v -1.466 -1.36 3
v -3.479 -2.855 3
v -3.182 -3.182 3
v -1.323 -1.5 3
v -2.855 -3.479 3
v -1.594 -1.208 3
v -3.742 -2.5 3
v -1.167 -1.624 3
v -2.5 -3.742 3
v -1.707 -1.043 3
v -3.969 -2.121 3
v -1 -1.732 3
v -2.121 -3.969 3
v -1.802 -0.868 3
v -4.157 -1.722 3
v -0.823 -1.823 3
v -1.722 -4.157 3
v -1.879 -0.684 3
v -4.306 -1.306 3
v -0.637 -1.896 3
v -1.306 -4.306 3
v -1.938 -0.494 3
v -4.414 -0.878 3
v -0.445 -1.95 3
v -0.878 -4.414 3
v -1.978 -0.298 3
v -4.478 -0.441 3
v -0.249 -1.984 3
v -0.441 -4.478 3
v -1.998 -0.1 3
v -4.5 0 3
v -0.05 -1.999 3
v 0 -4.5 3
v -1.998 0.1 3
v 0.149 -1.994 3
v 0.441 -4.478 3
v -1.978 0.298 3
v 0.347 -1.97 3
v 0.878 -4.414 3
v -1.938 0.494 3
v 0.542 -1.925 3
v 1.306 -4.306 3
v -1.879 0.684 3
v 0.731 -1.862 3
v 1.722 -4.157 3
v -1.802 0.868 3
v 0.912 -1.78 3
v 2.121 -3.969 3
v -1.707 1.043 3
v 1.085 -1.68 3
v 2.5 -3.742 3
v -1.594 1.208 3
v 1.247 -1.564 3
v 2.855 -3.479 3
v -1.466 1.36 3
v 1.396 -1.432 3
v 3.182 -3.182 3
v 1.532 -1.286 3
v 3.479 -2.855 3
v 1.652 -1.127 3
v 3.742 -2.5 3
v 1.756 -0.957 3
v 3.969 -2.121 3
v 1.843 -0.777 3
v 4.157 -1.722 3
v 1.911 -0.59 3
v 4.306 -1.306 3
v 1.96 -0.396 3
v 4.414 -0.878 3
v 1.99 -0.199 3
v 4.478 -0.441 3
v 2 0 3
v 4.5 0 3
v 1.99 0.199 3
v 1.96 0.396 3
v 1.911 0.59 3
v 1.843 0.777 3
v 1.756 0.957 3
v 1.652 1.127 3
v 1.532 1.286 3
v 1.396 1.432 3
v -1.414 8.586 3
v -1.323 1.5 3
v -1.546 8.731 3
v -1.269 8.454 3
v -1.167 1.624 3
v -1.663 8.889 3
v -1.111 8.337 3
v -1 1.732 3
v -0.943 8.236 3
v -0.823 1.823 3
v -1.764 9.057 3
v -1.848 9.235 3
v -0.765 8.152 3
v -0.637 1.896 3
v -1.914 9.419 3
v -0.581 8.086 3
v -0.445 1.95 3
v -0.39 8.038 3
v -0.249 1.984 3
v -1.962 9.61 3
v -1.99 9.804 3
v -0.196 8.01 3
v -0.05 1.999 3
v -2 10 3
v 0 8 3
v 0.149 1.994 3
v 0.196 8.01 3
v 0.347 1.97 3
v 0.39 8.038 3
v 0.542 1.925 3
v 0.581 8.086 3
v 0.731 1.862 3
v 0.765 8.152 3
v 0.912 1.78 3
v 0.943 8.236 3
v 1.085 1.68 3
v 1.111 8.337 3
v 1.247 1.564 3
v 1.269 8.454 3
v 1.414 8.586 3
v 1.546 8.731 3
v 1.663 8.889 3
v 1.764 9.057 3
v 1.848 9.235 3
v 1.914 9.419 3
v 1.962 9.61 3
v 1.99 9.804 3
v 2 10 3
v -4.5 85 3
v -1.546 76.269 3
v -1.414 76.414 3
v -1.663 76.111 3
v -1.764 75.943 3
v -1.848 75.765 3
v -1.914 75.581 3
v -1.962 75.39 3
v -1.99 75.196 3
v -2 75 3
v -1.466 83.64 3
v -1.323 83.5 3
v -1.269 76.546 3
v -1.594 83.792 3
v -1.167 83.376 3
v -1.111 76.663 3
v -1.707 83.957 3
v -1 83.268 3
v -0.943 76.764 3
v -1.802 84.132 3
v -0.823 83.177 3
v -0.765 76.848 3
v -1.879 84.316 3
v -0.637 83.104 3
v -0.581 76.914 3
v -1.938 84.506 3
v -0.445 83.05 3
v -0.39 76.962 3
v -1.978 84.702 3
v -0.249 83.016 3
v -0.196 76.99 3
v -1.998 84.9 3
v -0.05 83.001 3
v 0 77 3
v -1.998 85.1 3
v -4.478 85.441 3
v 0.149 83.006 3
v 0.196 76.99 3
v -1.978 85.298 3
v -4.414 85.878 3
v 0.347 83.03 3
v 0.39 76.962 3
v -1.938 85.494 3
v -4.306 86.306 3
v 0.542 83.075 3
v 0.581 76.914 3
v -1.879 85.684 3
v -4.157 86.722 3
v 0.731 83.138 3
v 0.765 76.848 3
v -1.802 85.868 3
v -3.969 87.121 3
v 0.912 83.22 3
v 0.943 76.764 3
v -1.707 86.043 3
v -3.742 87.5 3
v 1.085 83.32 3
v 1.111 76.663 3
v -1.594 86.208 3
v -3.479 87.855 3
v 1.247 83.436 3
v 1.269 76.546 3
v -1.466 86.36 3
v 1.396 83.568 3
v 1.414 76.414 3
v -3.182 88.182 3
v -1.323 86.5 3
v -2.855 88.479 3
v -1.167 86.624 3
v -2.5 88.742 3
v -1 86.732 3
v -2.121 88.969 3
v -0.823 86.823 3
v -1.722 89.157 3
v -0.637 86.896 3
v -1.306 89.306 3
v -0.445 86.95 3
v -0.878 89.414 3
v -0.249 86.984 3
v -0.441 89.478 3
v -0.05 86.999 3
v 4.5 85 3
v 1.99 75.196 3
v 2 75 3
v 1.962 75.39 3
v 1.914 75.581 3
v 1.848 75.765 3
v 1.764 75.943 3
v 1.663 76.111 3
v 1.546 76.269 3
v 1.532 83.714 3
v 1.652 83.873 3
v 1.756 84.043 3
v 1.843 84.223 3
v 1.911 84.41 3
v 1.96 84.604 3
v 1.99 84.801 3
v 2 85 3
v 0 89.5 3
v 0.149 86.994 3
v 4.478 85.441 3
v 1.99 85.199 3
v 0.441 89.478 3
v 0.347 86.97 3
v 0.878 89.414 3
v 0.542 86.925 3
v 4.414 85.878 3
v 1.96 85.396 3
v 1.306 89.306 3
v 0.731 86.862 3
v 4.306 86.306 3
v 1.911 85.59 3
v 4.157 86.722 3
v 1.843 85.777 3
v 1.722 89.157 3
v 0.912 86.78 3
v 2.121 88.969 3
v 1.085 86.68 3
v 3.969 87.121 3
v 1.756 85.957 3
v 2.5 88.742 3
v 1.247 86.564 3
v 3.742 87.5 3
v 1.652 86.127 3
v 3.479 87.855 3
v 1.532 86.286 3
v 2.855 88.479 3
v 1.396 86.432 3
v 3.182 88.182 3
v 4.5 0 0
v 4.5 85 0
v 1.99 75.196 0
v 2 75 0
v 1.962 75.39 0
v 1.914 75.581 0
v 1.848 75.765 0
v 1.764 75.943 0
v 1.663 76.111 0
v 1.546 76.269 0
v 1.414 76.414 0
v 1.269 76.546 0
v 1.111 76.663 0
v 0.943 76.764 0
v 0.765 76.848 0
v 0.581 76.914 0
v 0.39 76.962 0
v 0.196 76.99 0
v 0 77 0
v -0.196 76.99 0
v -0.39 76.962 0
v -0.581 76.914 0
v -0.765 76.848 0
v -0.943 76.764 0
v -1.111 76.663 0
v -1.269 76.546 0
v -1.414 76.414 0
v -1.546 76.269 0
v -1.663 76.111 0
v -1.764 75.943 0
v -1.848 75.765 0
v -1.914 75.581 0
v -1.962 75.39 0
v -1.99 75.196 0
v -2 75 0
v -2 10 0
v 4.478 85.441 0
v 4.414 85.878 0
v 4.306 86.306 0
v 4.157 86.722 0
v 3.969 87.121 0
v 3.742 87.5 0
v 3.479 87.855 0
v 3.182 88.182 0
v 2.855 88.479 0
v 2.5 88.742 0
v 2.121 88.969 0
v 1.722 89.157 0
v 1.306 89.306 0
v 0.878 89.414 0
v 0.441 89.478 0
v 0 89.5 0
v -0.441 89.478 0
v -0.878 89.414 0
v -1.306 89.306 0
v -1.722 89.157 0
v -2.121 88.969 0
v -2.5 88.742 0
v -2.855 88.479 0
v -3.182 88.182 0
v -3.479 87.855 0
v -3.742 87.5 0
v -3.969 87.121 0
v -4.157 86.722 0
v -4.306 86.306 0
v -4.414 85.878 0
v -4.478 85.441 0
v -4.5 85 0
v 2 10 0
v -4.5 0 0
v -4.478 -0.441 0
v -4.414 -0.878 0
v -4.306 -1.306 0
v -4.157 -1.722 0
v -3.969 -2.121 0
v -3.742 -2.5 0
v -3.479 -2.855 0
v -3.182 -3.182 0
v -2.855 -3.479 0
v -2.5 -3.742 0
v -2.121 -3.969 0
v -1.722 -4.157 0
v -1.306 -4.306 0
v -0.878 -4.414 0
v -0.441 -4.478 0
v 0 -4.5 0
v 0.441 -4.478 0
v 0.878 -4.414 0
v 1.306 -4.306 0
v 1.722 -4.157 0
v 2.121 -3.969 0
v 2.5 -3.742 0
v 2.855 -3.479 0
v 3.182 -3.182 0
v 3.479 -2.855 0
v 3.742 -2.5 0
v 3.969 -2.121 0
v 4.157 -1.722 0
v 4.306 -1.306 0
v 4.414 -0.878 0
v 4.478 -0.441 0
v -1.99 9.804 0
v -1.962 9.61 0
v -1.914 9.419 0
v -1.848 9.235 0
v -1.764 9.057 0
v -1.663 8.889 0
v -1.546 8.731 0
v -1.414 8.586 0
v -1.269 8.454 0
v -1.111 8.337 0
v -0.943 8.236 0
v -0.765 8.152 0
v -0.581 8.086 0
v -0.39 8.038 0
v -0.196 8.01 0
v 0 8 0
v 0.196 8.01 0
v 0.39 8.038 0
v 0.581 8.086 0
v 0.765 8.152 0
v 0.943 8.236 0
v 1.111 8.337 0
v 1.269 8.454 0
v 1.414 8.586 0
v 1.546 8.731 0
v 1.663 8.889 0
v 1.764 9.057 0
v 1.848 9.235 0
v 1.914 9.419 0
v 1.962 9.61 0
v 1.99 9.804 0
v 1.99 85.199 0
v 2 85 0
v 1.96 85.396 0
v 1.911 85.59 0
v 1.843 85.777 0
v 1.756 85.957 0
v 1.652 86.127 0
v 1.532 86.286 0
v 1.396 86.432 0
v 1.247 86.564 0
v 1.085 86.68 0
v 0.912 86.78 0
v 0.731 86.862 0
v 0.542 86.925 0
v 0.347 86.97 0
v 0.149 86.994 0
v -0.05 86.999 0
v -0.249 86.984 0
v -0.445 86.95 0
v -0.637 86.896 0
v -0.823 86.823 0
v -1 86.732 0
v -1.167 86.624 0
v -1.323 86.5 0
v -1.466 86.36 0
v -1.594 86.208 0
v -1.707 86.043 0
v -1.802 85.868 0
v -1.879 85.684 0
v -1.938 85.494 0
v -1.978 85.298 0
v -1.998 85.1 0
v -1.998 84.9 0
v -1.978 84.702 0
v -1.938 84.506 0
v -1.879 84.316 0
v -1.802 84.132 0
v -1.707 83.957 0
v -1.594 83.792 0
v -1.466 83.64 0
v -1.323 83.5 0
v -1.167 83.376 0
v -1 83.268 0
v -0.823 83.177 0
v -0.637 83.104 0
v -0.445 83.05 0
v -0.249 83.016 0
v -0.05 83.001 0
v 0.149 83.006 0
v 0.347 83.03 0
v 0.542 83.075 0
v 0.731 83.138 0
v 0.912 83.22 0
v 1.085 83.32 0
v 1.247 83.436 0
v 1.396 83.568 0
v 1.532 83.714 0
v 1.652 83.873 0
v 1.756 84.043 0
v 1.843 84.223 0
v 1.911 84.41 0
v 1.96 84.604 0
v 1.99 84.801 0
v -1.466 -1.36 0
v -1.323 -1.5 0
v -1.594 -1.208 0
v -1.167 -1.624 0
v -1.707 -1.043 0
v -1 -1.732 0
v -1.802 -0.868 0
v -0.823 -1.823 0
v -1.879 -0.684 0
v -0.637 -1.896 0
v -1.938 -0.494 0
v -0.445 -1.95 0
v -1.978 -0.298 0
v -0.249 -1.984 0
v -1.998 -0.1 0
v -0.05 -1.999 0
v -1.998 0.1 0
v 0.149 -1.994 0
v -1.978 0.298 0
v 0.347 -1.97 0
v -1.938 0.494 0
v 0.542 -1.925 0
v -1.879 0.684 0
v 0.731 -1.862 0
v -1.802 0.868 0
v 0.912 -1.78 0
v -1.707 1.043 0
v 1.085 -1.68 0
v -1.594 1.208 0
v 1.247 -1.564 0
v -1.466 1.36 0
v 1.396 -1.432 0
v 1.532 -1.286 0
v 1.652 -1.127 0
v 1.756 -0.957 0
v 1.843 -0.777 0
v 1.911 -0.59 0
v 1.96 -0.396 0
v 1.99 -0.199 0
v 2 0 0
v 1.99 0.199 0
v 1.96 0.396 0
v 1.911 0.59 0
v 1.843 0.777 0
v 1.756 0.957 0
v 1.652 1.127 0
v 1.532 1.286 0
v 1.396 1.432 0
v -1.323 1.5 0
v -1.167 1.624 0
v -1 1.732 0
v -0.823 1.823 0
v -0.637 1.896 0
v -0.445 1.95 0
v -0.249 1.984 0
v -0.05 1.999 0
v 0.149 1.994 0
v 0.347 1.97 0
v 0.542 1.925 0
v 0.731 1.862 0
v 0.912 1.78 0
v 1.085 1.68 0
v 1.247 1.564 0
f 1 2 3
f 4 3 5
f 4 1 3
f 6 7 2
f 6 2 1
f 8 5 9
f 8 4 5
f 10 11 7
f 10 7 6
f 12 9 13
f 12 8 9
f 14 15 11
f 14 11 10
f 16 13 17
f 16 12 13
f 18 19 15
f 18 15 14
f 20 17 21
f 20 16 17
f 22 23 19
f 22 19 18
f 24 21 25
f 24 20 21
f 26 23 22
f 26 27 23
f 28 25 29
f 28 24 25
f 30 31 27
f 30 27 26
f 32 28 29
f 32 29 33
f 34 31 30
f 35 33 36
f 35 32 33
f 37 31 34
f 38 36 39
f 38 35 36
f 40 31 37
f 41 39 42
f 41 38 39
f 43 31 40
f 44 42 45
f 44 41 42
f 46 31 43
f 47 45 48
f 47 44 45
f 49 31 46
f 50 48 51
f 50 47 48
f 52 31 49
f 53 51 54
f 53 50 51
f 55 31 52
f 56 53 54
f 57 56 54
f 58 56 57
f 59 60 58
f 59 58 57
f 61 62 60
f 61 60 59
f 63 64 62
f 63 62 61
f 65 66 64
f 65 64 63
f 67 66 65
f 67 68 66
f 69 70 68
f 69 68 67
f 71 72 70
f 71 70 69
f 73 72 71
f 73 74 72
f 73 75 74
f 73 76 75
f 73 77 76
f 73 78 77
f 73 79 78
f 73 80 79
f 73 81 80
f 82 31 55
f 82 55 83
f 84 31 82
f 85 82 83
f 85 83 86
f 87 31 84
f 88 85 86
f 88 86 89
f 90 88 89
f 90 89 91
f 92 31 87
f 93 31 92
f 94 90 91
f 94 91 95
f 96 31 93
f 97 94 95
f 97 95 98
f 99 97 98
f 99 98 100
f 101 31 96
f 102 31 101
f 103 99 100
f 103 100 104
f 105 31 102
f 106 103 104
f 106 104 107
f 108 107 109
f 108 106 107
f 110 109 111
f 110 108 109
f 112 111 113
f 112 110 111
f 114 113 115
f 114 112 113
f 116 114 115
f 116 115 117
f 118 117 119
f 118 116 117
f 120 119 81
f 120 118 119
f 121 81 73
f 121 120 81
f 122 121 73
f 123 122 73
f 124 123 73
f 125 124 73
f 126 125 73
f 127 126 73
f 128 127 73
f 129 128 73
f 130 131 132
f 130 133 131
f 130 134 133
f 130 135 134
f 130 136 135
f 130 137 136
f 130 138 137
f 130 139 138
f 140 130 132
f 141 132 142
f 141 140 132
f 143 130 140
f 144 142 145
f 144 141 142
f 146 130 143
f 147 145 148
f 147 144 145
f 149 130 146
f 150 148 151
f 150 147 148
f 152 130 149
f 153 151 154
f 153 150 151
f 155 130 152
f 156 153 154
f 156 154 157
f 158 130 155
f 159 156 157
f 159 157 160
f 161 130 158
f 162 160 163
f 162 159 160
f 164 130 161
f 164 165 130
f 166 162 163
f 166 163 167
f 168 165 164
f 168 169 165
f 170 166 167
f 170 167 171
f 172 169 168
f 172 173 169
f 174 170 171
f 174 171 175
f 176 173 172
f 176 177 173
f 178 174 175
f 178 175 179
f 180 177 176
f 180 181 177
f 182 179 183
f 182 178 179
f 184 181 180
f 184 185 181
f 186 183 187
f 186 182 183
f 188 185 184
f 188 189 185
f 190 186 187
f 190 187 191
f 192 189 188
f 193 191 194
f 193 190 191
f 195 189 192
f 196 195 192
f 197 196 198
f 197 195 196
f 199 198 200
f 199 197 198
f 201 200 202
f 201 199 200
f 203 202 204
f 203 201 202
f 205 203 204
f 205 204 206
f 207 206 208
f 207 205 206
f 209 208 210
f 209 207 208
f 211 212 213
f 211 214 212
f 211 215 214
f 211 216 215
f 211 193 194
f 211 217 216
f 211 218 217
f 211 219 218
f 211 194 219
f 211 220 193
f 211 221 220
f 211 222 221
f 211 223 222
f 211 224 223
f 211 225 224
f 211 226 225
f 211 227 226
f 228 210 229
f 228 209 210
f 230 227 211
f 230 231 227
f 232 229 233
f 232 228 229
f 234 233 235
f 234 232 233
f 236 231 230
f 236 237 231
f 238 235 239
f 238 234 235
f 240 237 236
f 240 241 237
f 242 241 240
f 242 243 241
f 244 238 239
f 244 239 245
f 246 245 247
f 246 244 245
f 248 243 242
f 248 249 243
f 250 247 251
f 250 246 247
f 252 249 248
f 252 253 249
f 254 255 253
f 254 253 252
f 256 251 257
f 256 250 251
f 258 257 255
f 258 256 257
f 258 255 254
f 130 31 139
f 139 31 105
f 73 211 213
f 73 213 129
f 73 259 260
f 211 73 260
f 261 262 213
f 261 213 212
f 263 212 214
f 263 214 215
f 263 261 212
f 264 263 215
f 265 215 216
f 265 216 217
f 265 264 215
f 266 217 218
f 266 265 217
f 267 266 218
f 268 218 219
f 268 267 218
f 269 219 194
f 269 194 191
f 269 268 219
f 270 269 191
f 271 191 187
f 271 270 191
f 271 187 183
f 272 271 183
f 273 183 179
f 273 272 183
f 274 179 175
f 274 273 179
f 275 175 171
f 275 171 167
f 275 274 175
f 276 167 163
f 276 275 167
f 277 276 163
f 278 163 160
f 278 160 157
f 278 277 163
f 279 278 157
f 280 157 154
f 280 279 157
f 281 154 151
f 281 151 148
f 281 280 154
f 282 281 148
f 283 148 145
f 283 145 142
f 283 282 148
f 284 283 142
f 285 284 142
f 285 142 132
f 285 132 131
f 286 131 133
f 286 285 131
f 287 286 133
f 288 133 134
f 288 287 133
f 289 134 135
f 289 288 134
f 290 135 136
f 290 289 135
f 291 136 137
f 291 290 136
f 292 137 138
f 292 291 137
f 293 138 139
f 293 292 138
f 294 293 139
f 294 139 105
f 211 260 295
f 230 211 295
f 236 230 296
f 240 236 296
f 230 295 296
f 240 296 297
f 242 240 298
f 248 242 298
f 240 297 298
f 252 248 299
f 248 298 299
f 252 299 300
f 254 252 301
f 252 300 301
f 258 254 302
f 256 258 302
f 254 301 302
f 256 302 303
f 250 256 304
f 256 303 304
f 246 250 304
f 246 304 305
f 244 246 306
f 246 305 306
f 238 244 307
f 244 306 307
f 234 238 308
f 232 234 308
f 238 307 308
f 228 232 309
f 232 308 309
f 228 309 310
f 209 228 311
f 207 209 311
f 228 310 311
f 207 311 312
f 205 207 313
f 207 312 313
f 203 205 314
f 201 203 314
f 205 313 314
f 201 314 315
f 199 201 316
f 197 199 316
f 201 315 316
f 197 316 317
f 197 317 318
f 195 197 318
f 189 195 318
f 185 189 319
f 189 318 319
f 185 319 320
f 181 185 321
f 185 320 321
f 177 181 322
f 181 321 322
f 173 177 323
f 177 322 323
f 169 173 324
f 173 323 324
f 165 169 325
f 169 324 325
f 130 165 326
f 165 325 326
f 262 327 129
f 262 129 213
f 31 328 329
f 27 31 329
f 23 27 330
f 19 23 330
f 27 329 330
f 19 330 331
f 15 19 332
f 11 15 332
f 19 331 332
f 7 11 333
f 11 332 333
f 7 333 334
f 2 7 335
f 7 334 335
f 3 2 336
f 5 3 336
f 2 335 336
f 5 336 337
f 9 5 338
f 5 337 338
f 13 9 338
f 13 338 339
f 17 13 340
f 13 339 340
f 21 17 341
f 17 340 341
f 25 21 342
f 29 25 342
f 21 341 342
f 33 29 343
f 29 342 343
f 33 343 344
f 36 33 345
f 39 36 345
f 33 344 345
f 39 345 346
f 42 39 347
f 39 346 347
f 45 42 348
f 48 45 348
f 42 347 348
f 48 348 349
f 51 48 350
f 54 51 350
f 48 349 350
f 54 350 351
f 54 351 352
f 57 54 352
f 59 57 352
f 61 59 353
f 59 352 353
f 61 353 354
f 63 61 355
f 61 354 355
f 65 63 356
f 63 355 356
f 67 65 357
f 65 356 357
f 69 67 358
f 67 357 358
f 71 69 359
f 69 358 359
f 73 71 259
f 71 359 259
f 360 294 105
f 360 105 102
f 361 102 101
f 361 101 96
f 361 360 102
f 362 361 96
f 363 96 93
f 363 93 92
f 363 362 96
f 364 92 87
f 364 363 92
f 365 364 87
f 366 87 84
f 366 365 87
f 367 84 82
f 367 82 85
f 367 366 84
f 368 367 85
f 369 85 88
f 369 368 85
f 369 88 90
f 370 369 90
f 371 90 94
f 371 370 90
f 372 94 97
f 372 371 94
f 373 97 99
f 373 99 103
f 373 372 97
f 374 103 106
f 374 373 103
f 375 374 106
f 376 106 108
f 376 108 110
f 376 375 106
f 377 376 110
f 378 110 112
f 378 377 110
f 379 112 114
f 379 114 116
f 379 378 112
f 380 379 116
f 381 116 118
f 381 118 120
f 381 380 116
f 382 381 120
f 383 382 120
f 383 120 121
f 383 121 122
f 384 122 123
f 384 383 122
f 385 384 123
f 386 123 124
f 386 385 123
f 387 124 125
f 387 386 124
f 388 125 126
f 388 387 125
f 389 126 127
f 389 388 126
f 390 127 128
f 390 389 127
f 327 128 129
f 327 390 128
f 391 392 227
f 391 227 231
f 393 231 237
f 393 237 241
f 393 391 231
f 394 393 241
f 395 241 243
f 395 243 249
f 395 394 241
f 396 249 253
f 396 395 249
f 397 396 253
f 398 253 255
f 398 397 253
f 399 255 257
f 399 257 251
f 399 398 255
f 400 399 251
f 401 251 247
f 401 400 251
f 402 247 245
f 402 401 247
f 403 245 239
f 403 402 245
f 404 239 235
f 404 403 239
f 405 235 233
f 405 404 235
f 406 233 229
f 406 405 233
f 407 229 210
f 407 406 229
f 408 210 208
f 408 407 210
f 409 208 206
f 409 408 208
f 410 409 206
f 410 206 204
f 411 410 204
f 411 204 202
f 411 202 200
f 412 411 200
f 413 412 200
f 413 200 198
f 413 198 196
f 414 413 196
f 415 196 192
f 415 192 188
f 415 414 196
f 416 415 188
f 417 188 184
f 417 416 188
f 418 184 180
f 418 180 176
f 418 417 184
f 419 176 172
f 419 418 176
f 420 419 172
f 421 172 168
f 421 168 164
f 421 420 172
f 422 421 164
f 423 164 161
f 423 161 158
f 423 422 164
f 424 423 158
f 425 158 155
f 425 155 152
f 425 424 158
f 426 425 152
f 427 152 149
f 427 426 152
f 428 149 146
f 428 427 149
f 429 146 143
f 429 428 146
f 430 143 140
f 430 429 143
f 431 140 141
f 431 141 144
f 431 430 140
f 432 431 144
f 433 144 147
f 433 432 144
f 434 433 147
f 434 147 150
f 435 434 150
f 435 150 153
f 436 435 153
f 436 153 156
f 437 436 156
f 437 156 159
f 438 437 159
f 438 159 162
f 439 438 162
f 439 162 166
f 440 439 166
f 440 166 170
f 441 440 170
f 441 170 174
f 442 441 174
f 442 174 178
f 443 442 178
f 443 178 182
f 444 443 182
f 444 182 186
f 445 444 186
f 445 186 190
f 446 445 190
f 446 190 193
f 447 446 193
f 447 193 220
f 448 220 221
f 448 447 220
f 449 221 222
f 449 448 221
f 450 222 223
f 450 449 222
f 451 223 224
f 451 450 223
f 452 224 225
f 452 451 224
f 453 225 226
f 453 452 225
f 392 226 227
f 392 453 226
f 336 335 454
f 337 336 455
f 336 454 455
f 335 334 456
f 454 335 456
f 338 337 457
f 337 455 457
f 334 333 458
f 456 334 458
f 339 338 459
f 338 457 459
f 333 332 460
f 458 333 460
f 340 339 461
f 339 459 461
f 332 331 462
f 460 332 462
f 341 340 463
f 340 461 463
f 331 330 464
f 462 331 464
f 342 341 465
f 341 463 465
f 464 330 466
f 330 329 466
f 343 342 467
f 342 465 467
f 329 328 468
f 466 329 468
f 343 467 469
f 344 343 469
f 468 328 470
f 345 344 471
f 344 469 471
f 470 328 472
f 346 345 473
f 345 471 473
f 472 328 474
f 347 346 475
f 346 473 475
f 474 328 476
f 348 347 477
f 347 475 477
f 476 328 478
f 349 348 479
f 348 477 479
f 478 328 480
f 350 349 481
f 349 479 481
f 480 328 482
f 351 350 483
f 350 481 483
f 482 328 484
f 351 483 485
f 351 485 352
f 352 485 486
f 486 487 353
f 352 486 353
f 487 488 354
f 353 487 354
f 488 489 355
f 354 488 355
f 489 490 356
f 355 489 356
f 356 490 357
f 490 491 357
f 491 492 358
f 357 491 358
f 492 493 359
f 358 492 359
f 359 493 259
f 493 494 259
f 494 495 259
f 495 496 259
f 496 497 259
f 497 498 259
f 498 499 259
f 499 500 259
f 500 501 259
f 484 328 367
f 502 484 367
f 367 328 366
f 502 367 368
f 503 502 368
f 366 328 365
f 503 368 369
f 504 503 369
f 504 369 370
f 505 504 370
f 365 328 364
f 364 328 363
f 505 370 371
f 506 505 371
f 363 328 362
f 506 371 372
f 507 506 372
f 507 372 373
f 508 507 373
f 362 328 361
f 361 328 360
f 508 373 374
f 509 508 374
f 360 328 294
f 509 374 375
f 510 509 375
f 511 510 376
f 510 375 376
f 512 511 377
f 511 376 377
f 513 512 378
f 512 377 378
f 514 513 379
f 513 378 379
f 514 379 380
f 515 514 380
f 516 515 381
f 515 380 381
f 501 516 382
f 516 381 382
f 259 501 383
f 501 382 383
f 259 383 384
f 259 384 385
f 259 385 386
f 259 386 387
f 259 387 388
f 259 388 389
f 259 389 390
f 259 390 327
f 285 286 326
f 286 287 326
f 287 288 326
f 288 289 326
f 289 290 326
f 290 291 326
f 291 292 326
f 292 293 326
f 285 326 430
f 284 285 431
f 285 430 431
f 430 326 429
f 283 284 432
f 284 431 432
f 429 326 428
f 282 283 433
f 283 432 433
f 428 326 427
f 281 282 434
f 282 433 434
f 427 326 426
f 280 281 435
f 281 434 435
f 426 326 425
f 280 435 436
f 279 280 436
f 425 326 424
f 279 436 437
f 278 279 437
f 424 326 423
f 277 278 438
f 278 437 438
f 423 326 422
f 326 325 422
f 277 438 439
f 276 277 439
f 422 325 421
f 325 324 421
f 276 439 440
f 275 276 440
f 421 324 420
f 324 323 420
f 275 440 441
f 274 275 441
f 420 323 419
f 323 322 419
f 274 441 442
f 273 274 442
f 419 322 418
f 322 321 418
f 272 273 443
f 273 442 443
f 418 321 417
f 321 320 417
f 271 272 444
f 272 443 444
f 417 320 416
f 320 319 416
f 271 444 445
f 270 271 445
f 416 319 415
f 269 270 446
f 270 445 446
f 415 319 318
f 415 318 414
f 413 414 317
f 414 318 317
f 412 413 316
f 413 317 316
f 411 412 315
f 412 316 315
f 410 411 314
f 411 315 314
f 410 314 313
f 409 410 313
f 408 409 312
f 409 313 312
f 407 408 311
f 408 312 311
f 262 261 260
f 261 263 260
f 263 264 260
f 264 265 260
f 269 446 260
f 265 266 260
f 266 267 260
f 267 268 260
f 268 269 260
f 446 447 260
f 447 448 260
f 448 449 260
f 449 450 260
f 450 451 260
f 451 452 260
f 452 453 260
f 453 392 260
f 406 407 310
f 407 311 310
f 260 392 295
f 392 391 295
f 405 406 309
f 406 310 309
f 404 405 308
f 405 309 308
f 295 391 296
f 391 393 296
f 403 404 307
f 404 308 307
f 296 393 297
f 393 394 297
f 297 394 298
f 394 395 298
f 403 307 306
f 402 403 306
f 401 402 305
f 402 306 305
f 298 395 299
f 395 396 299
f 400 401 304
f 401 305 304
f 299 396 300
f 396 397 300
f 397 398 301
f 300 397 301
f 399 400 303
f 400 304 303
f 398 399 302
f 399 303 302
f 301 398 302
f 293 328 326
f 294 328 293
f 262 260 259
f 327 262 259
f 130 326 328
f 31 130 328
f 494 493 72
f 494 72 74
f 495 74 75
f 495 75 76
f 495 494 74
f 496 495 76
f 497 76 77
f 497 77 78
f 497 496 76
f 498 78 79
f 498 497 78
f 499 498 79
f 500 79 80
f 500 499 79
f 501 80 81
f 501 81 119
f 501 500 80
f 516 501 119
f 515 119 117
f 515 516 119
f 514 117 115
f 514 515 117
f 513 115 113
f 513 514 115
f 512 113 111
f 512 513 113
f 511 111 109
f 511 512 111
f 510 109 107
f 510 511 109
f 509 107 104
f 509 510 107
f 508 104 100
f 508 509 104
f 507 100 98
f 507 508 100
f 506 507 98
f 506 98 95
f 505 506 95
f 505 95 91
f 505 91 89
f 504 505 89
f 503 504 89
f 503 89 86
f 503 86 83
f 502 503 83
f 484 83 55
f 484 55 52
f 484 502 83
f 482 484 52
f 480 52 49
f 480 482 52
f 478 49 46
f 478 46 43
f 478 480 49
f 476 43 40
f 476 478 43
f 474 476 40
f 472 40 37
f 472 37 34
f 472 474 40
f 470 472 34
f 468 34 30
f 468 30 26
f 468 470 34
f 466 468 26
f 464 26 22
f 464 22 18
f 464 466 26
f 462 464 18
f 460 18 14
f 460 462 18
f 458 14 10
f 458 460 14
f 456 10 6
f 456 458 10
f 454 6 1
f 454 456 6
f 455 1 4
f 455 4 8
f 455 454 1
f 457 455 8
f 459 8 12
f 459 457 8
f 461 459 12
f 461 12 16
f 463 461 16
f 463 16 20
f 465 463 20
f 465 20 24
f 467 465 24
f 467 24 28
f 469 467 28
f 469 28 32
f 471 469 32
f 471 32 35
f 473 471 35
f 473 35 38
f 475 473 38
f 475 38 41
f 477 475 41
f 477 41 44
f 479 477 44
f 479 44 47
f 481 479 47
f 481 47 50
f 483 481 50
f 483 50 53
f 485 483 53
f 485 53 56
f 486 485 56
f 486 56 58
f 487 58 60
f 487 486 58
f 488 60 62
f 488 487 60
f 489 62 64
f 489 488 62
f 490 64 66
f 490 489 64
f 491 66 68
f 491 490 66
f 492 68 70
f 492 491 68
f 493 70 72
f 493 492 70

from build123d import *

# Parameters (mm, degrees)
CROQUIS1_R              = 2
SALIENTE_EXTRUIR1_DEPTH = 3


with BuildPart() as part:
    # Croquis1 → Saliente-Extruir1 (new body)
    with BuildSketch(Plane.XY):
        with BuildLine():
            Line((-4.5, 85), (-4.5, 0))
            ThreePointArc((-4.5, 0), (0, -4.5), (4.5, 0))
            Line((4.5, 0), (4.5, 85))
            ThreePointArc((4.5, 85), (0, 89.5), (-4.5, 85))
        make_face()
        with Locations((0, 85)):
            Circle(CROQUIS1_R, mode=Mode.SUBTRACT)
        Circle(CROQUIS1_R, mode=Mode.SUBTRACT)
        with BuildLine():
            Line((-2, 75), (-2, 10))
            ThreePointArc((-2, 10), (0, 8), (2, 10))
            Line((2, 10), (2, 75))
            ThreePointArc((2, 75), (0, 77), (-2, 75))
        make_face(mode=Mode.SUBTRACT)
    extrude(amount=SALIENTE_EXTRUIR1_DEPTH)


solid = part.part
